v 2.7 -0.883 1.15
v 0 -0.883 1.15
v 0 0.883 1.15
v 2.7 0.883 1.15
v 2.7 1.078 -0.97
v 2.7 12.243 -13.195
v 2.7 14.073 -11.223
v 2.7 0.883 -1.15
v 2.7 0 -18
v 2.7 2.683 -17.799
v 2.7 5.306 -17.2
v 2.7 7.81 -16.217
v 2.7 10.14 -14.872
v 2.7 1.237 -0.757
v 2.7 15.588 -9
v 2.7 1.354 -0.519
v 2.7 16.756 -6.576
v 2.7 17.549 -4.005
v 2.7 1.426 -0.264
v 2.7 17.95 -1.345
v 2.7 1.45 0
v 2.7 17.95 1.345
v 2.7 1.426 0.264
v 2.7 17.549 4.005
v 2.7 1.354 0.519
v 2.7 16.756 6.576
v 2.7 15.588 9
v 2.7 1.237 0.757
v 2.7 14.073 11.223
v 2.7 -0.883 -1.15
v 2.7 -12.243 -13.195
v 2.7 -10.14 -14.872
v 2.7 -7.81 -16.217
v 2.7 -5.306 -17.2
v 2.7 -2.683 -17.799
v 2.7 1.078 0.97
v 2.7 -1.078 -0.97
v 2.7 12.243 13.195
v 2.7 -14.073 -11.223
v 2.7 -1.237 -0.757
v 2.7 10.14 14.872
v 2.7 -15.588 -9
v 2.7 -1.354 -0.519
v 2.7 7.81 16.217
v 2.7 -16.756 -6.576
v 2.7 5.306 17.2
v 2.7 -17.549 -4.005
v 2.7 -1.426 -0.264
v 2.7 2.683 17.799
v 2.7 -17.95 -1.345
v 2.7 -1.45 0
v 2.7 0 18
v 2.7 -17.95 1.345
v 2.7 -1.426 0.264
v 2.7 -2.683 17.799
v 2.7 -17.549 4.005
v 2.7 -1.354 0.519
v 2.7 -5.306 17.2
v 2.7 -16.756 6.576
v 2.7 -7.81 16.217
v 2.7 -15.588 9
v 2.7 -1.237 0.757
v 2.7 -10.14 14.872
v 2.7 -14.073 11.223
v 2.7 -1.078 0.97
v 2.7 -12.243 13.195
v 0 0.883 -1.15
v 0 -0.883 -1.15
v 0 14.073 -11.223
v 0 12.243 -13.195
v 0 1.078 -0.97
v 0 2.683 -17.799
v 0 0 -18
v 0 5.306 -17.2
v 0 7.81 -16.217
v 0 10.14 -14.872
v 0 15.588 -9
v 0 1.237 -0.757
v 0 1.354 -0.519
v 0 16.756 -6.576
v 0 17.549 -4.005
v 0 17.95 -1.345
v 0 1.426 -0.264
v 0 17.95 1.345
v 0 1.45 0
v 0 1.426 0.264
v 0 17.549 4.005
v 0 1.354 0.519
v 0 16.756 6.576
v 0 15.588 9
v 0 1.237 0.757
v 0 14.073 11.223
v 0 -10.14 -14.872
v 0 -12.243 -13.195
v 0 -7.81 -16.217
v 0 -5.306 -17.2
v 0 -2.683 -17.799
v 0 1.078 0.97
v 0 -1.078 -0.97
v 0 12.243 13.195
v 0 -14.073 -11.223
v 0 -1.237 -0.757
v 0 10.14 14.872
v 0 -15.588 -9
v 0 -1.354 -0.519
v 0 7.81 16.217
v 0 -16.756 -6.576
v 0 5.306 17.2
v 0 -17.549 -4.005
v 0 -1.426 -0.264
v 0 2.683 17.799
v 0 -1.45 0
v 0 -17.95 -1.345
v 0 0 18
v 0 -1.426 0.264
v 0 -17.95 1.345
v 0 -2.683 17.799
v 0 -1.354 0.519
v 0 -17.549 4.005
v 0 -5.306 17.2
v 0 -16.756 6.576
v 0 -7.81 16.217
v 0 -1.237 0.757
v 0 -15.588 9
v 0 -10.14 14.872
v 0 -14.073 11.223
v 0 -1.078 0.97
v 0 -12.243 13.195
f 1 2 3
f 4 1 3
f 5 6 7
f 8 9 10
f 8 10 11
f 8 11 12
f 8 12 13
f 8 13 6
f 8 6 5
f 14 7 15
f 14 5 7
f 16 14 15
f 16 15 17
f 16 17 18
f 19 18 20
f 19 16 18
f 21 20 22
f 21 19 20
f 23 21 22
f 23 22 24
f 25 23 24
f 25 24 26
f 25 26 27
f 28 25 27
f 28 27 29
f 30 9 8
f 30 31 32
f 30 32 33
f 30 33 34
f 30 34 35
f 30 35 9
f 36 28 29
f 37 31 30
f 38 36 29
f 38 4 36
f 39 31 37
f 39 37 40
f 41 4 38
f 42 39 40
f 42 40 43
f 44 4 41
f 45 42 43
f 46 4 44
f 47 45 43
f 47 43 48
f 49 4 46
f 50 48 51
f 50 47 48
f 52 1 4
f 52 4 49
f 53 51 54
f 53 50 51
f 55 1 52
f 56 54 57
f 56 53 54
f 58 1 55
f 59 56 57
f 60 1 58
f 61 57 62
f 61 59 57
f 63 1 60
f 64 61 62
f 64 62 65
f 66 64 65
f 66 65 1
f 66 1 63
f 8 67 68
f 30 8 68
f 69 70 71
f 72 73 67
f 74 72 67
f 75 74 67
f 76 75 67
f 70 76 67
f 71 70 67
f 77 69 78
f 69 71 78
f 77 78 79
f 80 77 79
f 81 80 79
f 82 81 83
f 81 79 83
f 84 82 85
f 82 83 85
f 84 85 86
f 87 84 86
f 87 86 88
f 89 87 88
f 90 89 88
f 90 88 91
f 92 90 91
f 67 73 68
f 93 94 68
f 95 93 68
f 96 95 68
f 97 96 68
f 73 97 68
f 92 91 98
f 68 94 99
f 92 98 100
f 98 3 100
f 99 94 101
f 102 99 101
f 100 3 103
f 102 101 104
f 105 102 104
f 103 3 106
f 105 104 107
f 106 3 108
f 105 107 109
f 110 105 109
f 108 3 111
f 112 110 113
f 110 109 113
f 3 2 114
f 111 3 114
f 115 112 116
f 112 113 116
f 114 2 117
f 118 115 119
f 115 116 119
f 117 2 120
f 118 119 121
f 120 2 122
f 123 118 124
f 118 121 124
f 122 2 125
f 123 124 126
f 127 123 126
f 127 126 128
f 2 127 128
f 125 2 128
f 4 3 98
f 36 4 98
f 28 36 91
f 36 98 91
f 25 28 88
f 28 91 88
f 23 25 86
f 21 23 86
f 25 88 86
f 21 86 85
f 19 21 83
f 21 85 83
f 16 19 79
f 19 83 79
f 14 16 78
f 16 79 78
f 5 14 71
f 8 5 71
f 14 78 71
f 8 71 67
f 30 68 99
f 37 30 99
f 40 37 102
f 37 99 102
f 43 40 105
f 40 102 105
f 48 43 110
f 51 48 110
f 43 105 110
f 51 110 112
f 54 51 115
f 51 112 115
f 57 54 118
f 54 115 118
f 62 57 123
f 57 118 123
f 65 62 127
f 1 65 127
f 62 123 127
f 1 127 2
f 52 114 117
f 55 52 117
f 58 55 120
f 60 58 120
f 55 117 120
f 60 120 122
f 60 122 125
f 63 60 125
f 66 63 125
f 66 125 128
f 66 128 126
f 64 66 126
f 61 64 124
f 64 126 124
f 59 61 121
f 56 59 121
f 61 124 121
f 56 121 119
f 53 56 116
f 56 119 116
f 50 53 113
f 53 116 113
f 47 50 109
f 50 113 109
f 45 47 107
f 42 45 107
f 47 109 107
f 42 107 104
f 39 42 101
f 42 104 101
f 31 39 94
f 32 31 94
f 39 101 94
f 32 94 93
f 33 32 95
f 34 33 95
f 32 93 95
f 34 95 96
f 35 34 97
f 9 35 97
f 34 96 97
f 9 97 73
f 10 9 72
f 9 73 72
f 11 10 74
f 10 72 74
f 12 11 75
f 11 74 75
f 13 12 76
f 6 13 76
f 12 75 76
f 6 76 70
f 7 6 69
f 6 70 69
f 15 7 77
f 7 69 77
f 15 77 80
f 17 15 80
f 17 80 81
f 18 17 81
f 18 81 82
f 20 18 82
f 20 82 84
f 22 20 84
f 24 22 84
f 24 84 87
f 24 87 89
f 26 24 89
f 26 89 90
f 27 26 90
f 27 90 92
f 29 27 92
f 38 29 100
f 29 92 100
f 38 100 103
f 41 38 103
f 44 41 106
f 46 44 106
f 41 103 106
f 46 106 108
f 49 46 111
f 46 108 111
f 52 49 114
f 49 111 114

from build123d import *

# Parameters (mm, degrees)
SKETCH1_R  = 18
BASE_DEPTH = 2.7


with BuildPart() as part:
    # Sketch1 → Base (new body)
    with BuildSketch(Plane(origin=(0, 0, 0), x_dir=(0, 0, -1), z_dir=(1, 0, 0))):
        with Locations(Location((0, 0, 0), (0, 0, 180))):
            Circle(SKETCH1_R)
        with BuildLine():
            Line((1.15, 0.883176087), (1.15, -0.883176087))
            ThreePointArc((1.15, -0.883176087), (0, -1.45), (-1.15, -0.883176087))
            Line((-1.15, -0.883176087), (-1.15, 0.883176087))
            ThreePointArc((-1.15, 0.883176087), (0, 1.45), (1.15, 0.883176087))
        make_face(mode=Mode.SUBTRACT)
    extrude(amount=BASE_DEPTH)


solid = part.part
